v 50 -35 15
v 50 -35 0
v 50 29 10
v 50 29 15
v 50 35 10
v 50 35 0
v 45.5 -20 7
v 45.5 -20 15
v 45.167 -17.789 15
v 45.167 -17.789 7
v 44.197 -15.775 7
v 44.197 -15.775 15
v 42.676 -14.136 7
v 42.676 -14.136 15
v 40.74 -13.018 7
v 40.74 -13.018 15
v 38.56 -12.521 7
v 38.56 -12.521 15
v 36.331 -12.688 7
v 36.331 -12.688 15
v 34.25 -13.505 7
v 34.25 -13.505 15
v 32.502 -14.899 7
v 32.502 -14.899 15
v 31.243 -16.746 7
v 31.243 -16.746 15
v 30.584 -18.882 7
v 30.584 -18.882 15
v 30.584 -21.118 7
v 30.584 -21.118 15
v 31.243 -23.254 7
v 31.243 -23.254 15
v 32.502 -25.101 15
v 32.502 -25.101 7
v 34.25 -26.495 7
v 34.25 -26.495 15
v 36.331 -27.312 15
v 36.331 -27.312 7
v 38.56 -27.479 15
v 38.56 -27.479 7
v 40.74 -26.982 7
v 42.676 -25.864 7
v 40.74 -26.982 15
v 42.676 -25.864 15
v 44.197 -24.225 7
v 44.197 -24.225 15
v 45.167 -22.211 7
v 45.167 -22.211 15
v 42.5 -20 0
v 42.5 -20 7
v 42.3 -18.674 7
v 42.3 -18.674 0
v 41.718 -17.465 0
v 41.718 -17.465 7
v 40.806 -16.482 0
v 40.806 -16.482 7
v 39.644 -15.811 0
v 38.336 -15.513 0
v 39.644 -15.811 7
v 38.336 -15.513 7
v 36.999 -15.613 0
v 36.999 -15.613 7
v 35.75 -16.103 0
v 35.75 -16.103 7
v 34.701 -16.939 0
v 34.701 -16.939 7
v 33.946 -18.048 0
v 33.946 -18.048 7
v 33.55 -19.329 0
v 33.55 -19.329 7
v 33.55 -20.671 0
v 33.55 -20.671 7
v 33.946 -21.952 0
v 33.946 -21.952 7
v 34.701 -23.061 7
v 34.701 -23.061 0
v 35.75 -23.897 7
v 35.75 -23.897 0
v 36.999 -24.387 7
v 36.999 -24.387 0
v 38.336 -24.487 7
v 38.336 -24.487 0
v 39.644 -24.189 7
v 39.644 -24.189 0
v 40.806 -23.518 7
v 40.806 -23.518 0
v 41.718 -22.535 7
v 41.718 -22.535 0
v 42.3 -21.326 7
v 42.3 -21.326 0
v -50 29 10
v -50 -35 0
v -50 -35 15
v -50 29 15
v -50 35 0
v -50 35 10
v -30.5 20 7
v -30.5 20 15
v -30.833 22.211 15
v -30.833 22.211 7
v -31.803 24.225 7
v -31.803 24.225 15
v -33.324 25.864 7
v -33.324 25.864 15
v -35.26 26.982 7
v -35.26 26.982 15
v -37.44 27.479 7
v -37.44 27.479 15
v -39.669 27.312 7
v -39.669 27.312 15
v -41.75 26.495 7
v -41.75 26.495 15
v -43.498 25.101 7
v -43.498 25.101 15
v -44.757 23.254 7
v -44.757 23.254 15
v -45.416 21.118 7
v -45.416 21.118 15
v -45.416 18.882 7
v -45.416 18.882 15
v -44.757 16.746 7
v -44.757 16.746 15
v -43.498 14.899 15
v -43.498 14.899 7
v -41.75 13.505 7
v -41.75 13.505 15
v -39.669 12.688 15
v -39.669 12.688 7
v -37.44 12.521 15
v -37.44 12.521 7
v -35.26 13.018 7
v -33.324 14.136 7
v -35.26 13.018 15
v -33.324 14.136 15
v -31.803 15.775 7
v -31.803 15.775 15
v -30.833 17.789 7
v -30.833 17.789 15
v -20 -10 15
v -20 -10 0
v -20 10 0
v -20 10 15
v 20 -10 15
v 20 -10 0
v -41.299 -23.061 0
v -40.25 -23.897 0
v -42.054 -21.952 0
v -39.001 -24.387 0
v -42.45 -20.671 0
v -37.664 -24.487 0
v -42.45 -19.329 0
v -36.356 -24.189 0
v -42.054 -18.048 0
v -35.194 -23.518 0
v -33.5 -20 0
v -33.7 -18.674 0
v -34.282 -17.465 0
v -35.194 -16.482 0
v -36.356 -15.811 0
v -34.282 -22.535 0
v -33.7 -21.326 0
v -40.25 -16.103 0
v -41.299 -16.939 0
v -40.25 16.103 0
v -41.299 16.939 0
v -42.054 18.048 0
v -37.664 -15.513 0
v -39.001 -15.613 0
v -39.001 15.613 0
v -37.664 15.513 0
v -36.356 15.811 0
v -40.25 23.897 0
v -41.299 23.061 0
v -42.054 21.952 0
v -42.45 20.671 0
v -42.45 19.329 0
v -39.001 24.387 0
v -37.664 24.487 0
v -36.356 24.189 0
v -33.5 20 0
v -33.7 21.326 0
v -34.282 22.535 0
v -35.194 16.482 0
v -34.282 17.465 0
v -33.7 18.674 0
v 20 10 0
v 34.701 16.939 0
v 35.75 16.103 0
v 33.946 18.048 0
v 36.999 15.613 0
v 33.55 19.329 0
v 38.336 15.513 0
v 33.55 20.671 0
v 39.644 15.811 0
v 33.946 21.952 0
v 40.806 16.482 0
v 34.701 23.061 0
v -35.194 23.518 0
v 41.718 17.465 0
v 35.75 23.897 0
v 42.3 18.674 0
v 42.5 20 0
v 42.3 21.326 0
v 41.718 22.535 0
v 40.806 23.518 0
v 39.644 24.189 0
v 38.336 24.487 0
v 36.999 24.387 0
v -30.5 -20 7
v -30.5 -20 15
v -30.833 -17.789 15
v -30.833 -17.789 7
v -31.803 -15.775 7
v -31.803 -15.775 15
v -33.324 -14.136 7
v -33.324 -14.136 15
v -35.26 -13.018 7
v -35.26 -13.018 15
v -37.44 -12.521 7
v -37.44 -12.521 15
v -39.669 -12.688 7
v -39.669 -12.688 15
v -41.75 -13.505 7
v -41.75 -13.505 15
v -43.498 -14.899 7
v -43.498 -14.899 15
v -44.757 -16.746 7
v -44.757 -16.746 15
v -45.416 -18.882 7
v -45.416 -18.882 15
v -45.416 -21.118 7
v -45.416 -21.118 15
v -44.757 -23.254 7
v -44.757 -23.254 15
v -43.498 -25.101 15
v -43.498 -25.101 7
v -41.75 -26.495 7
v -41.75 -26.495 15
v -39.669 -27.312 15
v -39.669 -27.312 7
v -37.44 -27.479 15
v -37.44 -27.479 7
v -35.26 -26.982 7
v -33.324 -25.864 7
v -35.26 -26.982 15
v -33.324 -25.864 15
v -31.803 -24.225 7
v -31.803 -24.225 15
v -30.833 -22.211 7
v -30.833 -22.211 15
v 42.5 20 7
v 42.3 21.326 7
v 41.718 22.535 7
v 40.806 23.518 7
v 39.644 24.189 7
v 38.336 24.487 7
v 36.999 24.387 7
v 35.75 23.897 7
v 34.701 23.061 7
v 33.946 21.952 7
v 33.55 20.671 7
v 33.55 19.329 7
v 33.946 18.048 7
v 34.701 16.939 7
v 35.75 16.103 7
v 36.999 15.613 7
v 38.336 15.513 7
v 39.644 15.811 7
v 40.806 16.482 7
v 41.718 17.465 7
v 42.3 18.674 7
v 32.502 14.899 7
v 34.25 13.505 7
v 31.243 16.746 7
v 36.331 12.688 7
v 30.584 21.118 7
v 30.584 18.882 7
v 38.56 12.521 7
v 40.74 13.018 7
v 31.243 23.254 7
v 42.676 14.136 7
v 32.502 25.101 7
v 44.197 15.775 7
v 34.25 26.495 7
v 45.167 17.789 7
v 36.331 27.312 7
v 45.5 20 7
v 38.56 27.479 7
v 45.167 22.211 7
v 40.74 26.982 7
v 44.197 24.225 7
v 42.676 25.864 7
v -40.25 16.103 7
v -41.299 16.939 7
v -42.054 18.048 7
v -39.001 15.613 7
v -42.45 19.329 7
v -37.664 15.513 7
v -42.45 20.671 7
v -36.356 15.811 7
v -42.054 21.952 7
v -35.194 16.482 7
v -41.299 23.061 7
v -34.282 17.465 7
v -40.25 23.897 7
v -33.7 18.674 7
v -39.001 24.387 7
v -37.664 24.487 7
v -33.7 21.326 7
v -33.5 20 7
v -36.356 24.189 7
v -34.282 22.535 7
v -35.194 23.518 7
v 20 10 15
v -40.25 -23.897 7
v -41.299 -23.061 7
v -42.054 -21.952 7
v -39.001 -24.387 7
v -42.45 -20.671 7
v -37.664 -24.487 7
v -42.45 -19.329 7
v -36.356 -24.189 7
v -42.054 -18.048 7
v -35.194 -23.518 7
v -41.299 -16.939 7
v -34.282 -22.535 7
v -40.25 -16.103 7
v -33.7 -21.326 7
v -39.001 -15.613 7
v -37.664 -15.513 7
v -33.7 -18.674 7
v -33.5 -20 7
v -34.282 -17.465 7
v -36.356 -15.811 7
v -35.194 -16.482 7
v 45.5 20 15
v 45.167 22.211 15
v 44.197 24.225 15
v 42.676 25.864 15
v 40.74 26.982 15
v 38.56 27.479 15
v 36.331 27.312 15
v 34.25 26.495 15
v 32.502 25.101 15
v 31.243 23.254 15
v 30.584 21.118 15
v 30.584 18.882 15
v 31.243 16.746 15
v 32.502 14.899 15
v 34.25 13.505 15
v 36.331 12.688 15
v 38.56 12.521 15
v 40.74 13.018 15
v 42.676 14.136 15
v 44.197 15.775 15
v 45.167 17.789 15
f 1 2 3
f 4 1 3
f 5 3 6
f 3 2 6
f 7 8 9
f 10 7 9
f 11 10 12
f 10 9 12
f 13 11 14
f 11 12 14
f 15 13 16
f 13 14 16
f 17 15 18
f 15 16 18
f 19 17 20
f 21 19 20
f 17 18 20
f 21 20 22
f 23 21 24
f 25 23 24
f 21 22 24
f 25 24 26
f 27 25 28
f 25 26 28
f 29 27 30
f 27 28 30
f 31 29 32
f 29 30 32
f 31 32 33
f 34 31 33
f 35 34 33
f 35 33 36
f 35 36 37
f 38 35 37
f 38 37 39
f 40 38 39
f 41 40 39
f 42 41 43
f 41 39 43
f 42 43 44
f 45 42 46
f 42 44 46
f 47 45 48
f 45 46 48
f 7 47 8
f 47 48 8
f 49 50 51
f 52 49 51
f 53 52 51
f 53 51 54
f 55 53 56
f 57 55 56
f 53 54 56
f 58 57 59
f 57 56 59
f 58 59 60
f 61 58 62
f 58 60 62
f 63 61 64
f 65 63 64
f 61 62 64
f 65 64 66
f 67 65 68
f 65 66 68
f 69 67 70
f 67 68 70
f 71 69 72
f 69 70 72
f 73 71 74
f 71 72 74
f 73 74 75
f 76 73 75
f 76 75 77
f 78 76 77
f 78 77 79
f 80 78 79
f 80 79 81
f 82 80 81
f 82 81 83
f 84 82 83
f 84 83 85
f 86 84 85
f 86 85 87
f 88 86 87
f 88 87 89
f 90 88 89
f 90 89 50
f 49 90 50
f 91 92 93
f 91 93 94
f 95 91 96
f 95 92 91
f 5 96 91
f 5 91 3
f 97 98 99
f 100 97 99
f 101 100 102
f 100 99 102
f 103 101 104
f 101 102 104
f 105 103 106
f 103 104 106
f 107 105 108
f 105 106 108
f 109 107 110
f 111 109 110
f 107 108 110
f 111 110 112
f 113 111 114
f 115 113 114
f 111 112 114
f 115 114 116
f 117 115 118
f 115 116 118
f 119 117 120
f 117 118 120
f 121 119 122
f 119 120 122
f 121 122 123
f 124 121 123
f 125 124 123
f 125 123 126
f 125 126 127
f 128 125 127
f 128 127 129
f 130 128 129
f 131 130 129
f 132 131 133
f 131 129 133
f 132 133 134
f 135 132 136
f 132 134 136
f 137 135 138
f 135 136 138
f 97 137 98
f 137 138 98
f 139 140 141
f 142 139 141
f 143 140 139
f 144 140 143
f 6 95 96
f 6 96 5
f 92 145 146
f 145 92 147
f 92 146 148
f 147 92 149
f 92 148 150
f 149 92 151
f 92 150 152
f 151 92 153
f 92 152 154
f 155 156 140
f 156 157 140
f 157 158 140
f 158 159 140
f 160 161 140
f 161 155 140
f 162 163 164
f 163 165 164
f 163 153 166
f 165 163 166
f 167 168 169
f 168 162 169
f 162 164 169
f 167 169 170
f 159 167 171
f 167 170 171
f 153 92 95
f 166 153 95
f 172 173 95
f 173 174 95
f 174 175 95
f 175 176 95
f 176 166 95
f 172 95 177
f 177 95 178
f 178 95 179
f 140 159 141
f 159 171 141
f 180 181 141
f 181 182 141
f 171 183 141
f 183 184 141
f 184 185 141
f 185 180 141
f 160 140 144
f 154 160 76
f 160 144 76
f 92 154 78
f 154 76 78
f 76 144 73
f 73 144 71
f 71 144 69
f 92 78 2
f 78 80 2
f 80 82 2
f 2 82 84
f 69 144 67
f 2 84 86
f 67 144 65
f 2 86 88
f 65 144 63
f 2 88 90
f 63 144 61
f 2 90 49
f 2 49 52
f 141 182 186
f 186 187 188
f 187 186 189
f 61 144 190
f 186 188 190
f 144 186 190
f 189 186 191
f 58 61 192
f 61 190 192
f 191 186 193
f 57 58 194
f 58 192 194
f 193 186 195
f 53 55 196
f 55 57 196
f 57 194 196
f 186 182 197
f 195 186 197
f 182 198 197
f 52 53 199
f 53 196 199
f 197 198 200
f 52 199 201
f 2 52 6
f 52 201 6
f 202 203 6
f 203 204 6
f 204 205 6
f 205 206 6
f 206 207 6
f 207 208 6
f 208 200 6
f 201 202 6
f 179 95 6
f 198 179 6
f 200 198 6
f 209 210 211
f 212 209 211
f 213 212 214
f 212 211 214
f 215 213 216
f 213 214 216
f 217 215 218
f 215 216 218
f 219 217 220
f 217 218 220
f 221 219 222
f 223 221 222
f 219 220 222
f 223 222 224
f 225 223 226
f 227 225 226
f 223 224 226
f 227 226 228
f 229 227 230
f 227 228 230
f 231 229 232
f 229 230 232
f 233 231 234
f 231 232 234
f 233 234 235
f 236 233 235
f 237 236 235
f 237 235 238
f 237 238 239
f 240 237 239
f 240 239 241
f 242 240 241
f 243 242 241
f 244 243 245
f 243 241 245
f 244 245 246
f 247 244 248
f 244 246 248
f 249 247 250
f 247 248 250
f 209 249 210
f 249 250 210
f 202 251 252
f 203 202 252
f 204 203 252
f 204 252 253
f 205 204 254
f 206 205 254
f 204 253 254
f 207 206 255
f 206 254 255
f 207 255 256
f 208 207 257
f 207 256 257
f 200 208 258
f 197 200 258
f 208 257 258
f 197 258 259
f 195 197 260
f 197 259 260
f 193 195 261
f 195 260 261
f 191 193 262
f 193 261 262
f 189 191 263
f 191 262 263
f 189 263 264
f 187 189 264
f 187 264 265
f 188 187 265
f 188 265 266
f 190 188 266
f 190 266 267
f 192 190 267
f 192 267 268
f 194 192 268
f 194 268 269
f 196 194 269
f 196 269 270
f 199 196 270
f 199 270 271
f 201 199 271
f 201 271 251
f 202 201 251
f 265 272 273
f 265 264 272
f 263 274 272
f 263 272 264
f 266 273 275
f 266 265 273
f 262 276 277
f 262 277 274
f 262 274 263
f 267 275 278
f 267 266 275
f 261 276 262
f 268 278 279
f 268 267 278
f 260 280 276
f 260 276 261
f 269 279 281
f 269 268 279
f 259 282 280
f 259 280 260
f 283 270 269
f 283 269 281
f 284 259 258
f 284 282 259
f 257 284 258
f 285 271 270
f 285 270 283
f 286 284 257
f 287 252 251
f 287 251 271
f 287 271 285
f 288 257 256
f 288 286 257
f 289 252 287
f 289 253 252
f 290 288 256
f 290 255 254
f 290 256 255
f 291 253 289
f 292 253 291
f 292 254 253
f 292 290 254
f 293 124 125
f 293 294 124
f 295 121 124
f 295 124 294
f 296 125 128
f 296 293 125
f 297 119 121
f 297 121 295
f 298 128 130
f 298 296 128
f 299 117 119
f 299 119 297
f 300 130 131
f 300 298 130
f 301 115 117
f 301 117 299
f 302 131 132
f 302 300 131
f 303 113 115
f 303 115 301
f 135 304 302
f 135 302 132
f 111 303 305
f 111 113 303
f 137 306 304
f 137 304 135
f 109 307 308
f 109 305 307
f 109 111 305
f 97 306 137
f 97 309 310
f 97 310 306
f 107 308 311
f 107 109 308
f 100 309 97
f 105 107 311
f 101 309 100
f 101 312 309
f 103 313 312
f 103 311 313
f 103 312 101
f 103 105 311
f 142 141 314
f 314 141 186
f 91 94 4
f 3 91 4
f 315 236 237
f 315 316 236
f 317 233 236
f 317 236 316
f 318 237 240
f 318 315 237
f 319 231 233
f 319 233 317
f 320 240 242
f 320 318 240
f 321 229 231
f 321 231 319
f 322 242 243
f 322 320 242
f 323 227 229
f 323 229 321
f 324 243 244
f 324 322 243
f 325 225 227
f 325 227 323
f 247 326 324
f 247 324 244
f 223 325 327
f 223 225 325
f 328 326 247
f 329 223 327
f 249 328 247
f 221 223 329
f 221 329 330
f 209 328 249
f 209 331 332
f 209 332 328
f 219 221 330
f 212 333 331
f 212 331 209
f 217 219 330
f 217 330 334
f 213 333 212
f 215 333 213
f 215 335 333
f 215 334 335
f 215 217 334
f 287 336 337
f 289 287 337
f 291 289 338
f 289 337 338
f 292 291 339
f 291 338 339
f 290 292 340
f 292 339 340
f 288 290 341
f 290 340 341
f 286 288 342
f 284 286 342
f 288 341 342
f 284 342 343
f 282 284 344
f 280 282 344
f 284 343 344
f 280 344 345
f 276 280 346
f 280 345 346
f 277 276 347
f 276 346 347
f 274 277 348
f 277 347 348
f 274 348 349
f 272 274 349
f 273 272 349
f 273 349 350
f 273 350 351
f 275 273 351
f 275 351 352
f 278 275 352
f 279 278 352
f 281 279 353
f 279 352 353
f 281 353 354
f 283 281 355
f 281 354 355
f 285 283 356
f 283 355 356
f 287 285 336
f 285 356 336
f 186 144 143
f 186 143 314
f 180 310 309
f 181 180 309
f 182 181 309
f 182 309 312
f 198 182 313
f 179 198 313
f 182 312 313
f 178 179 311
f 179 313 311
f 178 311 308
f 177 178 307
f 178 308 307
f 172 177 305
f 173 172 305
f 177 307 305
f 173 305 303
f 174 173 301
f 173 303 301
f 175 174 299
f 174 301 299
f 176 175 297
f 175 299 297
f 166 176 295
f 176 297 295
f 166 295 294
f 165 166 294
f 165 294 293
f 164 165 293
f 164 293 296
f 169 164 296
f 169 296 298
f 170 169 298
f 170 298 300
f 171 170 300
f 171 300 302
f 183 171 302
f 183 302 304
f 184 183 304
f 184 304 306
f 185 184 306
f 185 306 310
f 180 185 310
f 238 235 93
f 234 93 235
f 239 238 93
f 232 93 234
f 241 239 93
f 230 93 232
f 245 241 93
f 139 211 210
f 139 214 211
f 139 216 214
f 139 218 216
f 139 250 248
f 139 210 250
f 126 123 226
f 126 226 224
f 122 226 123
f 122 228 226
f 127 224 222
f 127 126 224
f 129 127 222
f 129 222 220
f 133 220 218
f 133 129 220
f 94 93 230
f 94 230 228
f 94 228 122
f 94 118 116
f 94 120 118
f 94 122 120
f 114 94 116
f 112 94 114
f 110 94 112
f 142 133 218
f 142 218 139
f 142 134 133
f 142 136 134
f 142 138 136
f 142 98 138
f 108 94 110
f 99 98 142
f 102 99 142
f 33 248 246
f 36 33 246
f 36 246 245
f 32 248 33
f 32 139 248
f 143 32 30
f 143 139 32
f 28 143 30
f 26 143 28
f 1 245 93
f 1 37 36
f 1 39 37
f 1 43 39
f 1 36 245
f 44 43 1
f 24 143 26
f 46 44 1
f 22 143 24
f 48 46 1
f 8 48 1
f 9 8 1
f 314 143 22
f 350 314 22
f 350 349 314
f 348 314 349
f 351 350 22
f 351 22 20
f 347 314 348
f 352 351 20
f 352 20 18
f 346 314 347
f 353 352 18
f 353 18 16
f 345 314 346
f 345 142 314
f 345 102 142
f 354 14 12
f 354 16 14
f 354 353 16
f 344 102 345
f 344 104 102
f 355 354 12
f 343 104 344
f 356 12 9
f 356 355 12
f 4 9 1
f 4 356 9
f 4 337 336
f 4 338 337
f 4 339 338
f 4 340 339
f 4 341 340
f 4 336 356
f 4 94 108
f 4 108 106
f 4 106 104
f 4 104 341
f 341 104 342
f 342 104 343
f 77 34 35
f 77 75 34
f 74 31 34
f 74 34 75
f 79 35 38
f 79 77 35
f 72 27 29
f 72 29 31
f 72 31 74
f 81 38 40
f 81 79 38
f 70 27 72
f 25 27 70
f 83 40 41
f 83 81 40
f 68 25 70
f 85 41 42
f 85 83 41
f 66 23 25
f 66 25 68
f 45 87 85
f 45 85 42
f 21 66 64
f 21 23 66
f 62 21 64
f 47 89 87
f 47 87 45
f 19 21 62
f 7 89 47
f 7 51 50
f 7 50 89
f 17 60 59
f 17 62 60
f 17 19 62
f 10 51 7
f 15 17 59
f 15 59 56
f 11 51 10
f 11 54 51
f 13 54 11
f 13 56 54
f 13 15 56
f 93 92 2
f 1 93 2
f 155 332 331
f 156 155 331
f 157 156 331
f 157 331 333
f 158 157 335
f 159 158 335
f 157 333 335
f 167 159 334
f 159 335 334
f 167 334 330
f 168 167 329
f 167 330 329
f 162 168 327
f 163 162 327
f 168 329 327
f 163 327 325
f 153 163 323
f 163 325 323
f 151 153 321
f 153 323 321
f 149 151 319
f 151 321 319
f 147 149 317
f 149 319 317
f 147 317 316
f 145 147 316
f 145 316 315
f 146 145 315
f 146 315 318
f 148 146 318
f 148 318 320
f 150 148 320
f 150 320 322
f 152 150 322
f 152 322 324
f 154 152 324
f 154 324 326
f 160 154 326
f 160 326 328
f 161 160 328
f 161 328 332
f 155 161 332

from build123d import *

# Parameters (mm, degrees)
SKETCH_1_W          = 100
SKETCH_1_H          = 70
EXTRUDE_1_DEPTH     = 15
SKETCH_2_W          = 100
SKETCH_2_H          = 6
CUT_EXTRUDE_1_DEPTH = 5
SKETCH_3_W          = 40
SKETCH_3_H          = 20
CUT_EXTRUDE_2_DEPTH = 63.84902545
SKETCH_4_R          = 7.5
CUT_EXTRUDE_3_DEPTH = 8
SKETCH_5_R          = 4.5
CUT_EXTRUDE_4_DEPTH = 63.84902545


with BuildPart() as part:
    # 草图1 → 凸台-拉伸1 (new body)
    with BuildSketch(Plane.XY):
        Rectangle(SKETCH_1_W, SKETCH_1_H)
    extrude(amount=EXTRUDE_1_DEPTH)

    # 草图2 → 切除-拉伸1 (cut)
    with BuildSketch(Plane.XY.offset(15)):
        with Locations((0, 32)):
            Rectangle(SKETCH_2_W, SKETCH_2_H)
    extrude(amount=-CUT_EXTRUDE_1_DEPTH, mode=Mode.SUBTRACT)

    # 草图3 → 切除-拉伸2 (cut, through all)
    with BuildSketch(Plane.XY):
        Rectangle(SKETCH_3_W, SKETCH_3_H)
    extrude(amount=CUT_EXTRUDE_2_DEPTH, mode=Mode.SUBTRACT)

    # 草图4 → 切除-拉伸3 (cut)
    with BuildSketch(Plane.XY.offset(15)):
        with Locations((38, 20)):
            Circle(SKETCH_4_R)
        with Locations((-38, 20)):
            Circle(SKETCH_4_R)
        with Locations((38, -20)):
            Circle(SKETCH_4_R)
        with Locations((-38, -20)):
            Circle(SKETCH_4_R)
    extrude(amount=-CUT_EXTRUDE_3_DEPTH, mode=Mode.SUBTRACT)

    # 草图5 → 切除-拉伸4 (cut, through all)
    with BuildSketch(Plane.XY.offset(15)):
        with Locations((38, 20)):
            Circle(SKETCH_5_R)
        with Locations((-38, 20)):
            Circle(SKETCH_5_R)
        with Locations((38, -20)):
            Circle(SKETCH_5_R)
        with Locations((-38, -20)):
            Circle(SKETCH_5_R)
    extrude(amount=-CUT_EXTRUDE_4_DEPTH, mode=Mode.SUBTRACT)


solid = part.part
